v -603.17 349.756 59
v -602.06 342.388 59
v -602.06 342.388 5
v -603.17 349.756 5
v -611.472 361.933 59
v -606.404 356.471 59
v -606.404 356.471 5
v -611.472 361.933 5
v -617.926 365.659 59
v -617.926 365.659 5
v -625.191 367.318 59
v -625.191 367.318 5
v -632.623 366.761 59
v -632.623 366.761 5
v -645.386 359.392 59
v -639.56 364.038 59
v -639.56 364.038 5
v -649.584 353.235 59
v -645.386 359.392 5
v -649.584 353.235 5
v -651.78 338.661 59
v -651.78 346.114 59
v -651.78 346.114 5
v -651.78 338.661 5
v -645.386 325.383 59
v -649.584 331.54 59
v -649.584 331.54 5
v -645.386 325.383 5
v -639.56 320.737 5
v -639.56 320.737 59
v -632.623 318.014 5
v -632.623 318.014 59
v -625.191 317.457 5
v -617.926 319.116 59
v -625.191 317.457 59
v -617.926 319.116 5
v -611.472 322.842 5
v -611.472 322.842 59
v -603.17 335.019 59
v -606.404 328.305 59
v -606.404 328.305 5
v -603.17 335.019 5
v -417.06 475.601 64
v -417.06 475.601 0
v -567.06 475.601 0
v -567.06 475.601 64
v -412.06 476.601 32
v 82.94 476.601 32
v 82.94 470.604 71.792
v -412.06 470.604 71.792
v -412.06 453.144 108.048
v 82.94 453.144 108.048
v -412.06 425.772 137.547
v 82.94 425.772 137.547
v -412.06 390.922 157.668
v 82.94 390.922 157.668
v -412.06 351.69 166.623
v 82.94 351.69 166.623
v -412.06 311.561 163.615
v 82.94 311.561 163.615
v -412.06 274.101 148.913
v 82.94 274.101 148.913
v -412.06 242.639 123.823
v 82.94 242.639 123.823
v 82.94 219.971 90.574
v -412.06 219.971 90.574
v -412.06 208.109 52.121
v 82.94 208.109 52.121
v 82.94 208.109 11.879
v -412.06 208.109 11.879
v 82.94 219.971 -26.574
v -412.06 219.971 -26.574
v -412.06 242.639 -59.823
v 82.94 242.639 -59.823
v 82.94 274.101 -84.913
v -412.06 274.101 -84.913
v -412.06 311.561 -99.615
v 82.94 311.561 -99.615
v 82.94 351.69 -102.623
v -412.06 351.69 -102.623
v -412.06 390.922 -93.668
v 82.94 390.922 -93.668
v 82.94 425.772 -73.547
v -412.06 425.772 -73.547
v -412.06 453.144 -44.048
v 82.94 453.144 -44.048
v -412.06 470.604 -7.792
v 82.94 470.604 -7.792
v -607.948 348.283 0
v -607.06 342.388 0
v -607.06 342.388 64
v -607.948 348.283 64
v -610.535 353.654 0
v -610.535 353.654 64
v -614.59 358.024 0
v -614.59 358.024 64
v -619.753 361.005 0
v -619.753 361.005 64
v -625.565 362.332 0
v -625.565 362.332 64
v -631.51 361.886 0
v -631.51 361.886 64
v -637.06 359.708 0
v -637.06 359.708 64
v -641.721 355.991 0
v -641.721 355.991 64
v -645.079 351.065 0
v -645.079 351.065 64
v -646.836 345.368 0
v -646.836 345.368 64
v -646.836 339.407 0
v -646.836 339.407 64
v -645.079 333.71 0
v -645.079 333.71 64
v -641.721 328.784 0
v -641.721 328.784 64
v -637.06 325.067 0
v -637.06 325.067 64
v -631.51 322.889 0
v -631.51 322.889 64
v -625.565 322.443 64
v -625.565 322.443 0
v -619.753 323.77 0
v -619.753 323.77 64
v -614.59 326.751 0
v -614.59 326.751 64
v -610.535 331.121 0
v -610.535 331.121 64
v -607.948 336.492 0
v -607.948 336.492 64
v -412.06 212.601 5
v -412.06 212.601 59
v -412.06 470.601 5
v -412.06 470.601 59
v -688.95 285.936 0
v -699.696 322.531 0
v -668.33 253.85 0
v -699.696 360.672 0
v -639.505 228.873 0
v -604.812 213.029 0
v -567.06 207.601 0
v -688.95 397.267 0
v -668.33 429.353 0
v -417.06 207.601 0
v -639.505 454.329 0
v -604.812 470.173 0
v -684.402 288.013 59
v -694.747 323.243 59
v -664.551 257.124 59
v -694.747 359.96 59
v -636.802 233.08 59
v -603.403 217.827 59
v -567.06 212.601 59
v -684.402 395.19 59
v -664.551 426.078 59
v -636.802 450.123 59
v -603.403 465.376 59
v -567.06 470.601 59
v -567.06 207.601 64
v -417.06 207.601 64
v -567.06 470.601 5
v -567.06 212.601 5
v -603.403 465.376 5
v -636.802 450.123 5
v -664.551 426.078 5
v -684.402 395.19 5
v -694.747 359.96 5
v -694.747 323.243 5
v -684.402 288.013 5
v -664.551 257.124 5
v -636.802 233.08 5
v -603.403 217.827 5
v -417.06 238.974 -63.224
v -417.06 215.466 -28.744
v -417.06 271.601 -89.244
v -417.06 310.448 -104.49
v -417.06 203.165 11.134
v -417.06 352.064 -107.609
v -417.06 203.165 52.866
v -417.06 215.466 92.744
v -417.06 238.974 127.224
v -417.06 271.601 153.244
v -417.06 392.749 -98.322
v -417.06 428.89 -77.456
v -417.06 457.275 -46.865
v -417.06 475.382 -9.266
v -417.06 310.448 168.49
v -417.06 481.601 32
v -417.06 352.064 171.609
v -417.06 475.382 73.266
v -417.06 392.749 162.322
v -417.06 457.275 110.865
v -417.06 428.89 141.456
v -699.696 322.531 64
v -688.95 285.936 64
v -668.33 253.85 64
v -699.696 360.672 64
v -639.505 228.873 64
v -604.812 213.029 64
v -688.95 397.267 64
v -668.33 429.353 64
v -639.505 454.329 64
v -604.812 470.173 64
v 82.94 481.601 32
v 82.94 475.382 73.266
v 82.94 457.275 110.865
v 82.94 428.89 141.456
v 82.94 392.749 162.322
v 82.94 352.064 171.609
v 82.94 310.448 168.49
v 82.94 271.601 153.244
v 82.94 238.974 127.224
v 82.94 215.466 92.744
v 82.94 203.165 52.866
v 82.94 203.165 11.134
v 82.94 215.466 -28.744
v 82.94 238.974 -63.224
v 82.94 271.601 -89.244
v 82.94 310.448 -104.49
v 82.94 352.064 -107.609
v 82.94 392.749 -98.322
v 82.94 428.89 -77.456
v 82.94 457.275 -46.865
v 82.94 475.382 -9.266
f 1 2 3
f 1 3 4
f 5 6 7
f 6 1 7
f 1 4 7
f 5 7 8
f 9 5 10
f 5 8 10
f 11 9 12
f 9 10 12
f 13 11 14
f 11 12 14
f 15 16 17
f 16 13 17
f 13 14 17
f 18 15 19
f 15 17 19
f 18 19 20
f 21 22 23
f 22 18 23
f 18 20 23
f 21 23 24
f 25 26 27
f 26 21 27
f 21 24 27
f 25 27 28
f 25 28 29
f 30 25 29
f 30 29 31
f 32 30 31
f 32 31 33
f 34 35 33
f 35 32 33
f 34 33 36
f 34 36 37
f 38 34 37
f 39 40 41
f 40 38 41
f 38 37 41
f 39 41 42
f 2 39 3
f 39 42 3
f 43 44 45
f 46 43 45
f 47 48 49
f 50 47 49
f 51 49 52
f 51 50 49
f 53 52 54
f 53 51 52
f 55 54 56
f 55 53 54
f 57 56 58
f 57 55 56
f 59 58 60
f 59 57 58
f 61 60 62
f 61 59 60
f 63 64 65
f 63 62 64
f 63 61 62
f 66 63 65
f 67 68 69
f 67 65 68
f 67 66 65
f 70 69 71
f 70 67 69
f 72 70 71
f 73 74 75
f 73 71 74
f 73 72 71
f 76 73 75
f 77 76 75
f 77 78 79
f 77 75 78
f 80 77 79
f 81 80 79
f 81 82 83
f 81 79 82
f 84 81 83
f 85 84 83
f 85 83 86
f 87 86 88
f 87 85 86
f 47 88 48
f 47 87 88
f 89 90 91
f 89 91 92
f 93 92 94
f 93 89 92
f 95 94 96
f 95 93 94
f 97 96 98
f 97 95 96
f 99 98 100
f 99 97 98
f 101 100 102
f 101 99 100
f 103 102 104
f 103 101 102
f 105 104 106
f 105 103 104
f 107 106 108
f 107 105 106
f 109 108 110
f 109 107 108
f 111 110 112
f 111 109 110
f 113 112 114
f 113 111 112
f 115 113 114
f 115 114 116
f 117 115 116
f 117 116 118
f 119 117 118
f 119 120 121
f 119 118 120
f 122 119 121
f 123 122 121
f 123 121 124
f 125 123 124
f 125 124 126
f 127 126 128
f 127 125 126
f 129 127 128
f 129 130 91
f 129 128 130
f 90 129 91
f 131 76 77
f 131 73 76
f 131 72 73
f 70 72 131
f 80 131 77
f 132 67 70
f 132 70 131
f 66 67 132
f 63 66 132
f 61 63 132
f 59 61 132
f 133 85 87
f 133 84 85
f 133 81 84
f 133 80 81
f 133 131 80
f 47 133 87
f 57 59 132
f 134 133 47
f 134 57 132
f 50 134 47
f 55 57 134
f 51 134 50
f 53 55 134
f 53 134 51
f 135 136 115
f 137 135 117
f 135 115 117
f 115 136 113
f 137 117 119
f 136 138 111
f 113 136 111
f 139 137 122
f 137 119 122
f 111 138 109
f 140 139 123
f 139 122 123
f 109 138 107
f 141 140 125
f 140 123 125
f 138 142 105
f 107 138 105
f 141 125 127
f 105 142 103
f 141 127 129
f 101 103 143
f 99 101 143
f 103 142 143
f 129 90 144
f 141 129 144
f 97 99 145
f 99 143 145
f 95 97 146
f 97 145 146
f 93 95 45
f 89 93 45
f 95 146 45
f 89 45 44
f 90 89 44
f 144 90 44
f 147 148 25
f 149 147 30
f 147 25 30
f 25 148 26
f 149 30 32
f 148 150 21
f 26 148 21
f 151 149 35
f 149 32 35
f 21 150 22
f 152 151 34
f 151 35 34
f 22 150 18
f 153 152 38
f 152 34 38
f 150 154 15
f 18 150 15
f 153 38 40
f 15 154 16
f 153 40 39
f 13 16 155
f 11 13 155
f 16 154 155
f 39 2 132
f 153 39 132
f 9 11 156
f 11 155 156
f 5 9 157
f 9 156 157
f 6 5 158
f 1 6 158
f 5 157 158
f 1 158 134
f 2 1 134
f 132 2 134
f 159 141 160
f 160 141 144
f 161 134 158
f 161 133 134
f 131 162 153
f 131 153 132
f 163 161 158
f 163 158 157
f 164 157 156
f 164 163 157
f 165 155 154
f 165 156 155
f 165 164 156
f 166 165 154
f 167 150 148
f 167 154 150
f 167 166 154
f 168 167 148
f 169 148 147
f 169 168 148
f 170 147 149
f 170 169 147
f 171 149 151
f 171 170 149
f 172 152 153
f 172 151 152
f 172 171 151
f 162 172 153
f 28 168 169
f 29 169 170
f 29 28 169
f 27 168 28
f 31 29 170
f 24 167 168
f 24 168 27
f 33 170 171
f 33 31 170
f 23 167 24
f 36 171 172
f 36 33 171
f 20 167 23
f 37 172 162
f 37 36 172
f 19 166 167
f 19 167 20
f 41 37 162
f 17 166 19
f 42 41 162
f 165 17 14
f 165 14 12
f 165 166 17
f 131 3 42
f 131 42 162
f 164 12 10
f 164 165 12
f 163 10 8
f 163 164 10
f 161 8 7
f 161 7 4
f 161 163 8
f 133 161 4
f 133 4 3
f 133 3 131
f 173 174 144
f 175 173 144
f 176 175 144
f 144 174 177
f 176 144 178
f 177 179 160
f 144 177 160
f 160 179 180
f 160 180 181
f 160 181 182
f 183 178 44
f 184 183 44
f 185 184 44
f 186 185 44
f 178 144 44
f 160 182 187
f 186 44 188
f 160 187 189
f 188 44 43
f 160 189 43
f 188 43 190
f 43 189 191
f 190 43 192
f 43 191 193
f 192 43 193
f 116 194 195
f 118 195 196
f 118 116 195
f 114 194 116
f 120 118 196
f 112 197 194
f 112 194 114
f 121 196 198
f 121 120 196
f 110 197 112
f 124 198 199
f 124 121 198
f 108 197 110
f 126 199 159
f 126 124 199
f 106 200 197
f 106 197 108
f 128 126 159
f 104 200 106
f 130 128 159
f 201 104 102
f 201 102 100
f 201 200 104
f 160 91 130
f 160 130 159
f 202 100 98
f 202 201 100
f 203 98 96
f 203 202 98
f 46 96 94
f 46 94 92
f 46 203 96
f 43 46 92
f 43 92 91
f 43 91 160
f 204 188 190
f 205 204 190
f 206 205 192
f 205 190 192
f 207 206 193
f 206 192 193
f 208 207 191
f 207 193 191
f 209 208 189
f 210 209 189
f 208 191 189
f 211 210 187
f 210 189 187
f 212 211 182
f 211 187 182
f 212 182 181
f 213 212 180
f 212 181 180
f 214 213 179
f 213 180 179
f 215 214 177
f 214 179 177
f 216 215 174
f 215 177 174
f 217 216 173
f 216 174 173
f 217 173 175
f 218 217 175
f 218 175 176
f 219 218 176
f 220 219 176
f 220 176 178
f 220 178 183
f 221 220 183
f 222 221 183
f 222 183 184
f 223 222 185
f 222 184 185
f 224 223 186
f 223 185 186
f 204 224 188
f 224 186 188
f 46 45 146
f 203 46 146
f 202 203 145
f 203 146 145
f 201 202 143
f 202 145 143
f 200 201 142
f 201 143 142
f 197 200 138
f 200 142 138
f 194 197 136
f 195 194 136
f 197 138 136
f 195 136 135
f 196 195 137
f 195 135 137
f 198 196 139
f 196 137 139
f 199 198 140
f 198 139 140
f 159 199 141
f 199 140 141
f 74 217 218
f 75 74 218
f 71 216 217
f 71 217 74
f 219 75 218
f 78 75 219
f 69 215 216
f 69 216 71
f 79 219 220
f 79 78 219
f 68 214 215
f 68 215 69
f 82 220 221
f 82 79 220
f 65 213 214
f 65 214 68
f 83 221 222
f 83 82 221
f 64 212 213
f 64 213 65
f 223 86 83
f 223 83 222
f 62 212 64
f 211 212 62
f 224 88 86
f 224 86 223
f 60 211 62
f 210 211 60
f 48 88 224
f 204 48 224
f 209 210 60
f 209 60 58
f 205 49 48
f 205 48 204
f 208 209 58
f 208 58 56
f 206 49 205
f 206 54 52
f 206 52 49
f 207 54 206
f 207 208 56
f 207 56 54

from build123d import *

# Parameters (mm, degrees)
EXTRUDE_1_DEPTH          = 64
CUT_EXTRUDE_1_DEPTH      = 850.57468483
CUT_EXTRUDE_1_DEPTH_BACK = 850.57468483
SKETCH_2_R               = 20
SKETCH_4_R               = 140
EXTRUDE_4_DEPTH          = 500
SHELL_6_T                = -5


with BuildPart() as part:
    # 草图1 → 凸台-拉伸1 (new body)
    with BuildSketch(Plane.XY):
        with BuildLine():
            Line((-567.059552989, 207.601354358), (-417.059552989, 207.601354358))
            Line((-417.059552989, 207.601354358), (-417.059552989, 475.601354358))
            Line((-417.059552989, 475.601354358), (-567.059552989, 475.601354358))
            ThreePointArc((-567.059552989, 475.601354358), (-701.059552989, 341.601354358), (-567.059552989, 207.601354358))
        make_face()
    extrude(amount=EXTRUDE_1_DEPTH)

    # 草图2 → 切除-拉伸1 (cut, two sides: drawn at the far end of the back side and taken through both)
    with BuildSketch(Plane.XY.offset(64).offset(-CUT_EXTRUDE_1_DEPTH_BACK)):
        with Locations((-627.059552989, 342.387508152)):
            Circle(SKETCH_2_R)
    extrude(amount=CUT_EXTRUDE_1_DEPTH + CUT_EXTRUDE_1_DEPTH_BACK, mode=Mode.SUBTRACT)

    # 草图4 → 凸台-拉伸4 (add)
    with BuildSketch(Plane(origin=(-417.059552989, 0, 0), x_dir=(0, 0, -1), z_dir=(1, 0, 0))):
        with Locations(Location((-32, 341.601354358, 0), (0, 0, 90))):
            Circle(SKETCH_4_R)
    extrude(amount=EXTRUDE_4_DEPTH)

    # 抽壳6
    shell_6_openings = [part.faces().sort_by_distance(p)[0] for p in [
        (82.940447011, 341.601354358, 32),
    ]]
    offset(amount=SHELL_6_T, openings=shell_6_openings, kind=Kind.INTERSECTION)


solid = part.part
